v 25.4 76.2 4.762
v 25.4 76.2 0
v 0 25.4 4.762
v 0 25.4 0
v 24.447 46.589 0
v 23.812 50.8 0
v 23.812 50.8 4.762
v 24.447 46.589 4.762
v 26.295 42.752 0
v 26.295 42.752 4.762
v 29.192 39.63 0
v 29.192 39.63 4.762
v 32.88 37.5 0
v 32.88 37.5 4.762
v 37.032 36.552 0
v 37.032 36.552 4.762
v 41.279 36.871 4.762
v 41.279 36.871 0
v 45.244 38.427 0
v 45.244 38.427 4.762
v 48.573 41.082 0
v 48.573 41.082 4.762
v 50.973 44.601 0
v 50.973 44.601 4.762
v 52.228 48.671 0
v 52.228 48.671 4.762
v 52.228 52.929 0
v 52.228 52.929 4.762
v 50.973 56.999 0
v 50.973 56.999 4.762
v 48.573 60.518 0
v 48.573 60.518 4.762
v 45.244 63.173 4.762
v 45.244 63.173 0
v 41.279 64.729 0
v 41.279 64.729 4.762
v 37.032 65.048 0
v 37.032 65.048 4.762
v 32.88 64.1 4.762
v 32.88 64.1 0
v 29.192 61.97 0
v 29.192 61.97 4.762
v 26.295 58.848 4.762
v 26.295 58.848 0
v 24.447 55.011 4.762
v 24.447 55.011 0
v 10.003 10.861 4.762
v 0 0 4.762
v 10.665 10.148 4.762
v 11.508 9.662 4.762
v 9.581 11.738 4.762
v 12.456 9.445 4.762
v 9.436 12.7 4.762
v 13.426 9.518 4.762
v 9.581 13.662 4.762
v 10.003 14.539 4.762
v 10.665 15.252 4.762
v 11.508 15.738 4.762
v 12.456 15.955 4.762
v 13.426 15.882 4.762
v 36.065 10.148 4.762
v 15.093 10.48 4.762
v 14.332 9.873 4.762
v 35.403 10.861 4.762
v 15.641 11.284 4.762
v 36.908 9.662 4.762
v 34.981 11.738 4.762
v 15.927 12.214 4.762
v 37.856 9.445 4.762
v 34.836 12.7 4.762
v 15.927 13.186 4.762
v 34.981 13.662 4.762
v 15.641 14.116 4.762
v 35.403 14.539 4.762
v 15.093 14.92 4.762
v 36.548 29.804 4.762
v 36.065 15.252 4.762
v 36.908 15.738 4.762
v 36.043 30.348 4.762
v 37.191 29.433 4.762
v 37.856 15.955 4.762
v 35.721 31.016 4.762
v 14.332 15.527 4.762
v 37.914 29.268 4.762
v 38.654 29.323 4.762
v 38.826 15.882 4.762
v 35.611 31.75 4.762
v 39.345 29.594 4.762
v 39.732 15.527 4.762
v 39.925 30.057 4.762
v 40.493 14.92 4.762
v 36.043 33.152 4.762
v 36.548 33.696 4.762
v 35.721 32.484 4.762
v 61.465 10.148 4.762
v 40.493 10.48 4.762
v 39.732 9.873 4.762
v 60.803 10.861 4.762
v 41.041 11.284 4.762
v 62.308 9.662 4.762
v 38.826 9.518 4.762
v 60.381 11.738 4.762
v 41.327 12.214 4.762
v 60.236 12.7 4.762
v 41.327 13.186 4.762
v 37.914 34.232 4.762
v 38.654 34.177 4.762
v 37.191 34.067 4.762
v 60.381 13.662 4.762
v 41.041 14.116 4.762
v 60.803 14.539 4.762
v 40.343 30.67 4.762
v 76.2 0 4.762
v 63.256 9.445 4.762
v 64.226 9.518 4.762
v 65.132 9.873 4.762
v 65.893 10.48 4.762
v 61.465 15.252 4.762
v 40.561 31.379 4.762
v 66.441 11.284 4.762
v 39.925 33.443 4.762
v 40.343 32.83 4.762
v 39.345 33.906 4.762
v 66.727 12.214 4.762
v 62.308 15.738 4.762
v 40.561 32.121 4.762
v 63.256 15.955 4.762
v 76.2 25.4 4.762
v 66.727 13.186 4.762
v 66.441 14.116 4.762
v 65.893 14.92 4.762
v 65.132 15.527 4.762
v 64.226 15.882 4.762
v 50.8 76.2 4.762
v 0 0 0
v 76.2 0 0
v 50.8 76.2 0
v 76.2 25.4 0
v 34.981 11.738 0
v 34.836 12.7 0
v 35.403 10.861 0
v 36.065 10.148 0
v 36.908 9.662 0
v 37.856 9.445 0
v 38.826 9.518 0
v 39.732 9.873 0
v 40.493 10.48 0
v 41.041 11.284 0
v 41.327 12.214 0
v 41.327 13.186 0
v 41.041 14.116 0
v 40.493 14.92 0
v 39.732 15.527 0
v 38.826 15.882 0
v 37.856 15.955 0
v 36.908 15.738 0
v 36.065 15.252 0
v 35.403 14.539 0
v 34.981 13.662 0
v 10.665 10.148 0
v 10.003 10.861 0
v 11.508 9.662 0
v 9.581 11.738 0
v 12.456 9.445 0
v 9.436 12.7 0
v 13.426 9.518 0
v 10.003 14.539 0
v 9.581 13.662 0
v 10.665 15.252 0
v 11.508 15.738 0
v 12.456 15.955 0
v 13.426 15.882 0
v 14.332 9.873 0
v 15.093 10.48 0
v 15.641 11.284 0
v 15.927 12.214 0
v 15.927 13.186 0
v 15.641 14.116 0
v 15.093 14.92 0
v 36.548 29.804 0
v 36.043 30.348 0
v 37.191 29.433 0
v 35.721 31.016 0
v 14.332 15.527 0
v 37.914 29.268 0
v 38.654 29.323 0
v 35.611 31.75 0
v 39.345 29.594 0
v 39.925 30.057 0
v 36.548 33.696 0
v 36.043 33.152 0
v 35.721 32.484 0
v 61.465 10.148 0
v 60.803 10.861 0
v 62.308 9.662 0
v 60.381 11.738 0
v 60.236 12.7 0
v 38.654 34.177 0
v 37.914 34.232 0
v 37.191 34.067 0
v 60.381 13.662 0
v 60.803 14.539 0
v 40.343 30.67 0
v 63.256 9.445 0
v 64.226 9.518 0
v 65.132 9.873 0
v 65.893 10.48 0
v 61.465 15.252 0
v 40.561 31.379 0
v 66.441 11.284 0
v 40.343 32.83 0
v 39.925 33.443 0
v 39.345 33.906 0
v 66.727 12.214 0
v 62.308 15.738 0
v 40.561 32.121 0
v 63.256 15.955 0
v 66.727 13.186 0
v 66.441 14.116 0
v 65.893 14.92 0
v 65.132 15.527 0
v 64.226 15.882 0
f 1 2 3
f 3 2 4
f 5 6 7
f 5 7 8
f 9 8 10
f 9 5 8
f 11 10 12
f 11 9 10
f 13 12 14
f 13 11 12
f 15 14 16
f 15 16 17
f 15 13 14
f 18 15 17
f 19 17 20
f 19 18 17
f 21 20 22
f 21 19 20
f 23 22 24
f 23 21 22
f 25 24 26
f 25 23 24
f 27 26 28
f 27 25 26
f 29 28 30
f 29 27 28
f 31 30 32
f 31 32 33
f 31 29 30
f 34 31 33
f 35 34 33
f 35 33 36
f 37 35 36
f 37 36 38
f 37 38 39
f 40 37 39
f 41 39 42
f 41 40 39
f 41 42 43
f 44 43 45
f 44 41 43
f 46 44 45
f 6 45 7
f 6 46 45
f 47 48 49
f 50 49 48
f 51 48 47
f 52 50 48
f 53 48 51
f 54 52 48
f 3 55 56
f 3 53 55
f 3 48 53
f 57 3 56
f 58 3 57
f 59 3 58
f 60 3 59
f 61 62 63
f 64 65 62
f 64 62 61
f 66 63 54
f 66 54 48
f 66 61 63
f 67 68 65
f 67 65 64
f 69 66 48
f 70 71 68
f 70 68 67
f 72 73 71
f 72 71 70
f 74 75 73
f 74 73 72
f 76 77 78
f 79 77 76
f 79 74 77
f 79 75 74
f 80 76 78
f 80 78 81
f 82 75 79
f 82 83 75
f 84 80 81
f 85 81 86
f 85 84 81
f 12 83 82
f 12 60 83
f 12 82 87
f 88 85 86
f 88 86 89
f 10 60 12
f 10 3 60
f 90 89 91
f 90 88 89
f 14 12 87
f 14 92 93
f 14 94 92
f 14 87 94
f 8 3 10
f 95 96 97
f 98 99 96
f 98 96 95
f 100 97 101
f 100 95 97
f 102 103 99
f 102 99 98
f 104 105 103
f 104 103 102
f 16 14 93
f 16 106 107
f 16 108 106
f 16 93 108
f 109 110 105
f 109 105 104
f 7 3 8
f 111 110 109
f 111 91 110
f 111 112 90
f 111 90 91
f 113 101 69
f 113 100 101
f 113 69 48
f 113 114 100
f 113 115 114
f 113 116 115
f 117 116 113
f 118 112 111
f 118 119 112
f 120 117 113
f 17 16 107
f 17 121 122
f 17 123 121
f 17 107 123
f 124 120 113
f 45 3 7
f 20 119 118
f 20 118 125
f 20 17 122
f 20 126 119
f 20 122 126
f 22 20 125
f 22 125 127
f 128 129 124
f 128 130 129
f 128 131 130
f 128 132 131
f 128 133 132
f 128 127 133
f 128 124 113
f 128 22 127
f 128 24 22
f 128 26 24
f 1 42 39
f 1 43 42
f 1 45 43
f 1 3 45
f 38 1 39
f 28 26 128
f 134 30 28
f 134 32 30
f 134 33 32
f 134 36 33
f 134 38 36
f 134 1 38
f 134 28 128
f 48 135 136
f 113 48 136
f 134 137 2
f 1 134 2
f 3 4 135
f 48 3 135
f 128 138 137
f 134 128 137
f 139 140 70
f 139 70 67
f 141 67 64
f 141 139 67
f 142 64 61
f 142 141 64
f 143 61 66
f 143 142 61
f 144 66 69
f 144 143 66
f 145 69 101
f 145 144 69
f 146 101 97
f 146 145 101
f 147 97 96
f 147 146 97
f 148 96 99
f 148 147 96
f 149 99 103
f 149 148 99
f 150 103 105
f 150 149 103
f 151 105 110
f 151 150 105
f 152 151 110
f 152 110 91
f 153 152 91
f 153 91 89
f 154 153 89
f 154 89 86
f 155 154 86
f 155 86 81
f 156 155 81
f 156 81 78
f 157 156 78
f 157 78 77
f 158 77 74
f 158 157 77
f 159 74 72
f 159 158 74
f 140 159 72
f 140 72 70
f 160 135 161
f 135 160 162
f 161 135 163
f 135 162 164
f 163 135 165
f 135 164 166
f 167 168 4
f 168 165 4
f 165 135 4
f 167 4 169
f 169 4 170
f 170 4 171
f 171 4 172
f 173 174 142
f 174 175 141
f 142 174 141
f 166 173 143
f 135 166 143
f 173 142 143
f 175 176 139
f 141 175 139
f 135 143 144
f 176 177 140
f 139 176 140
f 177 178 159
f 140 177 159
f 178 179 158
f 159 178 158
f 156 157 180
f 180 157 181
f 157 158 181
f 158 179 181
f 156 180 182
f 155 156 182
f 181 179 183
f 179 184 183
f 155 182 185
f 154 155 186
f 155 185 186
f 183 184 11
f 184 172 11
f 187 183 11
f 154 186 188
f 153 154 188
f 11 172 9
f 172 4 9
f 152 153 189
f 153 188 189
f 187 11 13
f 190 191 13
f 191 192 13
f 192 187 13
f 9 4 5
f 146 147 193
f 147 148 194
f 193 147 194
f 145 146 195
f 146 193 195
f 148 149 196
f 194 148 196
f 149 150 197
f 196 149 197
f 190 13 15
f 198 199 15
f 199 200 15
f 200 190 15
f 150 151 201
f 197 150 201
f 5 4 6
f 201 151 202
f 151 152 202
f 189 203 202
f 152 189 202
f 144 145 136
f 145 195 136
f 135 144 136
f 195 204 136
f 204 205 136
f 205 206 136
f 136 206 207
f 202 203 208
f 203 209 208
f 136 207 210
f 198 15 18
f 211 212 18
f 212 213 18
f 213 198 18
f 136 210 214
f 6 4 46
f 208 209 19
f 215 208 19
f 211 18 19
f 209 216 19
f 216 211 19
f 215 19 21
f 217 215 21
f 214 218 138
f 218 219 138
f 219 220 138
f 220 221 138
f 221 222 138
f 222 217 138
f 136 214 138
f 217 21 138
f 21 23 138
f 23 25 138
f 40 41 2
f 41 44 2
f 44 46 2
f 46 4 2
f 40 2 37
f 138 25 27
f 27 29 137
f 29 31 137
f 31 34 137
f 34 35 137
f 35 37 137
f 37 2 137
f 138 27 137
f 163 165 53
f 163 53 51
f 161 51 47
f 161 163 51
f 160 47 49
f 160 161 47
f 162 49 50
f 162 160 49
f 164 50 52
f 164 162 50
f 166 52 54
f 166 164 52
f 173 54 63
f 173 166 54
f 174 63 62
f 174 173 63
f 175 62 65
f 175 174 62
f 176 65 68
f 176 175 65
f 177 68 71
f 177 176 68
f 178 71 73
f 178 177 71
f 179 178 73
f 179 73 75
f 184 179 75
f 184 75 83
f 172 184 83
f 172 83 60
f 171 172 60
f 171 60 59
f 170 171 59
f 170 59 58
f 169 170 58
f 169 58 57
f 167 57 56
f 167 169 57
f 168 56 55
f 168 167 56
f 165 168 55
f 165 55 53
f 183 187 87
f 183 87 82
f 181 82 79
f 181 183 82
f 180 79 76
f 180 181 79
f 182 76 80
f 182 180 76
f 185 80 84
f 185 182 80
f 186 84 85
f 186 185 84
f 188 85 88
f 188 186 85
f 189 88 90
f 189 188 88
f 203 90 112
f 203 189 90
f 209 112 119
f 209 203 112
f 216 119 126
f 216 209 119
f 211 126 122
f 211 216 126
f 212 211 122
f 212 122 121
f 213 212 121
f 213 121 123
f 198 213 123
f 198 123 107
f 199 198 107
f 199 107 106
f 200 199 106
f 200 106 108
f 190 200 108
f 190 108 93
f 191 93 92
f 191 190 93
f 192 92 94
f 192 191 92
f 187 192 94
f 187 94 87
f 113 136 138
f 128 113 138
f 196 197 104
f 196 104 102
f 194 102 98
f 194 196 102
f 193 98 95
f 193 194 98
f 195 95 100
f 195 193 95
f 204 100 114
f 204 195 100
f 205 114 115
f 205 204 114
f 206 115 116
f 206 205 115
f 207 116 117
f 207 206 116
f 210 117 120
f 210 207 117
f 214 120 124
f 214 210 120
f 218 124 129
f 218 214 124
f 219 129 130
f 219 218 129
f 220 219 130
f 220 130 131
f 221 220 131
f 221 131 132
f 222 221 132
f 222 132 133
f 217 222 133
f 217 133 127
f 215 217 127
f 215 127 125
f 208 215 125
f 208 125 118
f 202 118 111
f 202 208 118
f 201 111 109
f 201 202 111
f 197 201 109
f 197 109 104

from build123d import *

# Parameters (mm, degrees)
SKETCH1_R           = 3.2639
SKETCH1_R_2         = 14.2875
SKETCH1_R_3         = 2.4892
BOSS_EXTRUDE1_DEPTH = 4.7625


with BuildPart() as part:
    # Sketch1 → Boss-Extrude1 (new body)
    with BuildSketch(Plane.XY):
        Polygon((0, 0), (76.2, 0), (76.2, 25.4), (50.8, 76.2), (25.4, 76.2), (0, 25.4), align=None)
        with Locations(Location((38.1, 12.7, 0), (0, 0, 180))):
            Circle(SKETCH1_R, mode=Mode.SUBTRACT)
        with Locations(Location((63.5, 12.7, 0), (0, 0, 180))):
            Circle(SKETCH1_R, mode=Mode.SUBTRACT)
        with Locations(Location((12.7, 12.7, 0), (0, 0, 180))):
            Circle(SKETCH1_R, mode=Mode.SUBTRACT)
        with Locations(Location((38.1, 50.8, 0), (0, 0, 180))):
            Circle(SKETCH1_R_2, mode=Mode.SUBTRACT)
        with Locations(Location((38.1, 31.75, 0), (0, 0, 180))):
            Circle(SKETCH1_R_3, mode=Mode.SUBTRACT)
    extrude(amount=BOSS_EXTRUDE1_DEPTH)


solid = part.part
